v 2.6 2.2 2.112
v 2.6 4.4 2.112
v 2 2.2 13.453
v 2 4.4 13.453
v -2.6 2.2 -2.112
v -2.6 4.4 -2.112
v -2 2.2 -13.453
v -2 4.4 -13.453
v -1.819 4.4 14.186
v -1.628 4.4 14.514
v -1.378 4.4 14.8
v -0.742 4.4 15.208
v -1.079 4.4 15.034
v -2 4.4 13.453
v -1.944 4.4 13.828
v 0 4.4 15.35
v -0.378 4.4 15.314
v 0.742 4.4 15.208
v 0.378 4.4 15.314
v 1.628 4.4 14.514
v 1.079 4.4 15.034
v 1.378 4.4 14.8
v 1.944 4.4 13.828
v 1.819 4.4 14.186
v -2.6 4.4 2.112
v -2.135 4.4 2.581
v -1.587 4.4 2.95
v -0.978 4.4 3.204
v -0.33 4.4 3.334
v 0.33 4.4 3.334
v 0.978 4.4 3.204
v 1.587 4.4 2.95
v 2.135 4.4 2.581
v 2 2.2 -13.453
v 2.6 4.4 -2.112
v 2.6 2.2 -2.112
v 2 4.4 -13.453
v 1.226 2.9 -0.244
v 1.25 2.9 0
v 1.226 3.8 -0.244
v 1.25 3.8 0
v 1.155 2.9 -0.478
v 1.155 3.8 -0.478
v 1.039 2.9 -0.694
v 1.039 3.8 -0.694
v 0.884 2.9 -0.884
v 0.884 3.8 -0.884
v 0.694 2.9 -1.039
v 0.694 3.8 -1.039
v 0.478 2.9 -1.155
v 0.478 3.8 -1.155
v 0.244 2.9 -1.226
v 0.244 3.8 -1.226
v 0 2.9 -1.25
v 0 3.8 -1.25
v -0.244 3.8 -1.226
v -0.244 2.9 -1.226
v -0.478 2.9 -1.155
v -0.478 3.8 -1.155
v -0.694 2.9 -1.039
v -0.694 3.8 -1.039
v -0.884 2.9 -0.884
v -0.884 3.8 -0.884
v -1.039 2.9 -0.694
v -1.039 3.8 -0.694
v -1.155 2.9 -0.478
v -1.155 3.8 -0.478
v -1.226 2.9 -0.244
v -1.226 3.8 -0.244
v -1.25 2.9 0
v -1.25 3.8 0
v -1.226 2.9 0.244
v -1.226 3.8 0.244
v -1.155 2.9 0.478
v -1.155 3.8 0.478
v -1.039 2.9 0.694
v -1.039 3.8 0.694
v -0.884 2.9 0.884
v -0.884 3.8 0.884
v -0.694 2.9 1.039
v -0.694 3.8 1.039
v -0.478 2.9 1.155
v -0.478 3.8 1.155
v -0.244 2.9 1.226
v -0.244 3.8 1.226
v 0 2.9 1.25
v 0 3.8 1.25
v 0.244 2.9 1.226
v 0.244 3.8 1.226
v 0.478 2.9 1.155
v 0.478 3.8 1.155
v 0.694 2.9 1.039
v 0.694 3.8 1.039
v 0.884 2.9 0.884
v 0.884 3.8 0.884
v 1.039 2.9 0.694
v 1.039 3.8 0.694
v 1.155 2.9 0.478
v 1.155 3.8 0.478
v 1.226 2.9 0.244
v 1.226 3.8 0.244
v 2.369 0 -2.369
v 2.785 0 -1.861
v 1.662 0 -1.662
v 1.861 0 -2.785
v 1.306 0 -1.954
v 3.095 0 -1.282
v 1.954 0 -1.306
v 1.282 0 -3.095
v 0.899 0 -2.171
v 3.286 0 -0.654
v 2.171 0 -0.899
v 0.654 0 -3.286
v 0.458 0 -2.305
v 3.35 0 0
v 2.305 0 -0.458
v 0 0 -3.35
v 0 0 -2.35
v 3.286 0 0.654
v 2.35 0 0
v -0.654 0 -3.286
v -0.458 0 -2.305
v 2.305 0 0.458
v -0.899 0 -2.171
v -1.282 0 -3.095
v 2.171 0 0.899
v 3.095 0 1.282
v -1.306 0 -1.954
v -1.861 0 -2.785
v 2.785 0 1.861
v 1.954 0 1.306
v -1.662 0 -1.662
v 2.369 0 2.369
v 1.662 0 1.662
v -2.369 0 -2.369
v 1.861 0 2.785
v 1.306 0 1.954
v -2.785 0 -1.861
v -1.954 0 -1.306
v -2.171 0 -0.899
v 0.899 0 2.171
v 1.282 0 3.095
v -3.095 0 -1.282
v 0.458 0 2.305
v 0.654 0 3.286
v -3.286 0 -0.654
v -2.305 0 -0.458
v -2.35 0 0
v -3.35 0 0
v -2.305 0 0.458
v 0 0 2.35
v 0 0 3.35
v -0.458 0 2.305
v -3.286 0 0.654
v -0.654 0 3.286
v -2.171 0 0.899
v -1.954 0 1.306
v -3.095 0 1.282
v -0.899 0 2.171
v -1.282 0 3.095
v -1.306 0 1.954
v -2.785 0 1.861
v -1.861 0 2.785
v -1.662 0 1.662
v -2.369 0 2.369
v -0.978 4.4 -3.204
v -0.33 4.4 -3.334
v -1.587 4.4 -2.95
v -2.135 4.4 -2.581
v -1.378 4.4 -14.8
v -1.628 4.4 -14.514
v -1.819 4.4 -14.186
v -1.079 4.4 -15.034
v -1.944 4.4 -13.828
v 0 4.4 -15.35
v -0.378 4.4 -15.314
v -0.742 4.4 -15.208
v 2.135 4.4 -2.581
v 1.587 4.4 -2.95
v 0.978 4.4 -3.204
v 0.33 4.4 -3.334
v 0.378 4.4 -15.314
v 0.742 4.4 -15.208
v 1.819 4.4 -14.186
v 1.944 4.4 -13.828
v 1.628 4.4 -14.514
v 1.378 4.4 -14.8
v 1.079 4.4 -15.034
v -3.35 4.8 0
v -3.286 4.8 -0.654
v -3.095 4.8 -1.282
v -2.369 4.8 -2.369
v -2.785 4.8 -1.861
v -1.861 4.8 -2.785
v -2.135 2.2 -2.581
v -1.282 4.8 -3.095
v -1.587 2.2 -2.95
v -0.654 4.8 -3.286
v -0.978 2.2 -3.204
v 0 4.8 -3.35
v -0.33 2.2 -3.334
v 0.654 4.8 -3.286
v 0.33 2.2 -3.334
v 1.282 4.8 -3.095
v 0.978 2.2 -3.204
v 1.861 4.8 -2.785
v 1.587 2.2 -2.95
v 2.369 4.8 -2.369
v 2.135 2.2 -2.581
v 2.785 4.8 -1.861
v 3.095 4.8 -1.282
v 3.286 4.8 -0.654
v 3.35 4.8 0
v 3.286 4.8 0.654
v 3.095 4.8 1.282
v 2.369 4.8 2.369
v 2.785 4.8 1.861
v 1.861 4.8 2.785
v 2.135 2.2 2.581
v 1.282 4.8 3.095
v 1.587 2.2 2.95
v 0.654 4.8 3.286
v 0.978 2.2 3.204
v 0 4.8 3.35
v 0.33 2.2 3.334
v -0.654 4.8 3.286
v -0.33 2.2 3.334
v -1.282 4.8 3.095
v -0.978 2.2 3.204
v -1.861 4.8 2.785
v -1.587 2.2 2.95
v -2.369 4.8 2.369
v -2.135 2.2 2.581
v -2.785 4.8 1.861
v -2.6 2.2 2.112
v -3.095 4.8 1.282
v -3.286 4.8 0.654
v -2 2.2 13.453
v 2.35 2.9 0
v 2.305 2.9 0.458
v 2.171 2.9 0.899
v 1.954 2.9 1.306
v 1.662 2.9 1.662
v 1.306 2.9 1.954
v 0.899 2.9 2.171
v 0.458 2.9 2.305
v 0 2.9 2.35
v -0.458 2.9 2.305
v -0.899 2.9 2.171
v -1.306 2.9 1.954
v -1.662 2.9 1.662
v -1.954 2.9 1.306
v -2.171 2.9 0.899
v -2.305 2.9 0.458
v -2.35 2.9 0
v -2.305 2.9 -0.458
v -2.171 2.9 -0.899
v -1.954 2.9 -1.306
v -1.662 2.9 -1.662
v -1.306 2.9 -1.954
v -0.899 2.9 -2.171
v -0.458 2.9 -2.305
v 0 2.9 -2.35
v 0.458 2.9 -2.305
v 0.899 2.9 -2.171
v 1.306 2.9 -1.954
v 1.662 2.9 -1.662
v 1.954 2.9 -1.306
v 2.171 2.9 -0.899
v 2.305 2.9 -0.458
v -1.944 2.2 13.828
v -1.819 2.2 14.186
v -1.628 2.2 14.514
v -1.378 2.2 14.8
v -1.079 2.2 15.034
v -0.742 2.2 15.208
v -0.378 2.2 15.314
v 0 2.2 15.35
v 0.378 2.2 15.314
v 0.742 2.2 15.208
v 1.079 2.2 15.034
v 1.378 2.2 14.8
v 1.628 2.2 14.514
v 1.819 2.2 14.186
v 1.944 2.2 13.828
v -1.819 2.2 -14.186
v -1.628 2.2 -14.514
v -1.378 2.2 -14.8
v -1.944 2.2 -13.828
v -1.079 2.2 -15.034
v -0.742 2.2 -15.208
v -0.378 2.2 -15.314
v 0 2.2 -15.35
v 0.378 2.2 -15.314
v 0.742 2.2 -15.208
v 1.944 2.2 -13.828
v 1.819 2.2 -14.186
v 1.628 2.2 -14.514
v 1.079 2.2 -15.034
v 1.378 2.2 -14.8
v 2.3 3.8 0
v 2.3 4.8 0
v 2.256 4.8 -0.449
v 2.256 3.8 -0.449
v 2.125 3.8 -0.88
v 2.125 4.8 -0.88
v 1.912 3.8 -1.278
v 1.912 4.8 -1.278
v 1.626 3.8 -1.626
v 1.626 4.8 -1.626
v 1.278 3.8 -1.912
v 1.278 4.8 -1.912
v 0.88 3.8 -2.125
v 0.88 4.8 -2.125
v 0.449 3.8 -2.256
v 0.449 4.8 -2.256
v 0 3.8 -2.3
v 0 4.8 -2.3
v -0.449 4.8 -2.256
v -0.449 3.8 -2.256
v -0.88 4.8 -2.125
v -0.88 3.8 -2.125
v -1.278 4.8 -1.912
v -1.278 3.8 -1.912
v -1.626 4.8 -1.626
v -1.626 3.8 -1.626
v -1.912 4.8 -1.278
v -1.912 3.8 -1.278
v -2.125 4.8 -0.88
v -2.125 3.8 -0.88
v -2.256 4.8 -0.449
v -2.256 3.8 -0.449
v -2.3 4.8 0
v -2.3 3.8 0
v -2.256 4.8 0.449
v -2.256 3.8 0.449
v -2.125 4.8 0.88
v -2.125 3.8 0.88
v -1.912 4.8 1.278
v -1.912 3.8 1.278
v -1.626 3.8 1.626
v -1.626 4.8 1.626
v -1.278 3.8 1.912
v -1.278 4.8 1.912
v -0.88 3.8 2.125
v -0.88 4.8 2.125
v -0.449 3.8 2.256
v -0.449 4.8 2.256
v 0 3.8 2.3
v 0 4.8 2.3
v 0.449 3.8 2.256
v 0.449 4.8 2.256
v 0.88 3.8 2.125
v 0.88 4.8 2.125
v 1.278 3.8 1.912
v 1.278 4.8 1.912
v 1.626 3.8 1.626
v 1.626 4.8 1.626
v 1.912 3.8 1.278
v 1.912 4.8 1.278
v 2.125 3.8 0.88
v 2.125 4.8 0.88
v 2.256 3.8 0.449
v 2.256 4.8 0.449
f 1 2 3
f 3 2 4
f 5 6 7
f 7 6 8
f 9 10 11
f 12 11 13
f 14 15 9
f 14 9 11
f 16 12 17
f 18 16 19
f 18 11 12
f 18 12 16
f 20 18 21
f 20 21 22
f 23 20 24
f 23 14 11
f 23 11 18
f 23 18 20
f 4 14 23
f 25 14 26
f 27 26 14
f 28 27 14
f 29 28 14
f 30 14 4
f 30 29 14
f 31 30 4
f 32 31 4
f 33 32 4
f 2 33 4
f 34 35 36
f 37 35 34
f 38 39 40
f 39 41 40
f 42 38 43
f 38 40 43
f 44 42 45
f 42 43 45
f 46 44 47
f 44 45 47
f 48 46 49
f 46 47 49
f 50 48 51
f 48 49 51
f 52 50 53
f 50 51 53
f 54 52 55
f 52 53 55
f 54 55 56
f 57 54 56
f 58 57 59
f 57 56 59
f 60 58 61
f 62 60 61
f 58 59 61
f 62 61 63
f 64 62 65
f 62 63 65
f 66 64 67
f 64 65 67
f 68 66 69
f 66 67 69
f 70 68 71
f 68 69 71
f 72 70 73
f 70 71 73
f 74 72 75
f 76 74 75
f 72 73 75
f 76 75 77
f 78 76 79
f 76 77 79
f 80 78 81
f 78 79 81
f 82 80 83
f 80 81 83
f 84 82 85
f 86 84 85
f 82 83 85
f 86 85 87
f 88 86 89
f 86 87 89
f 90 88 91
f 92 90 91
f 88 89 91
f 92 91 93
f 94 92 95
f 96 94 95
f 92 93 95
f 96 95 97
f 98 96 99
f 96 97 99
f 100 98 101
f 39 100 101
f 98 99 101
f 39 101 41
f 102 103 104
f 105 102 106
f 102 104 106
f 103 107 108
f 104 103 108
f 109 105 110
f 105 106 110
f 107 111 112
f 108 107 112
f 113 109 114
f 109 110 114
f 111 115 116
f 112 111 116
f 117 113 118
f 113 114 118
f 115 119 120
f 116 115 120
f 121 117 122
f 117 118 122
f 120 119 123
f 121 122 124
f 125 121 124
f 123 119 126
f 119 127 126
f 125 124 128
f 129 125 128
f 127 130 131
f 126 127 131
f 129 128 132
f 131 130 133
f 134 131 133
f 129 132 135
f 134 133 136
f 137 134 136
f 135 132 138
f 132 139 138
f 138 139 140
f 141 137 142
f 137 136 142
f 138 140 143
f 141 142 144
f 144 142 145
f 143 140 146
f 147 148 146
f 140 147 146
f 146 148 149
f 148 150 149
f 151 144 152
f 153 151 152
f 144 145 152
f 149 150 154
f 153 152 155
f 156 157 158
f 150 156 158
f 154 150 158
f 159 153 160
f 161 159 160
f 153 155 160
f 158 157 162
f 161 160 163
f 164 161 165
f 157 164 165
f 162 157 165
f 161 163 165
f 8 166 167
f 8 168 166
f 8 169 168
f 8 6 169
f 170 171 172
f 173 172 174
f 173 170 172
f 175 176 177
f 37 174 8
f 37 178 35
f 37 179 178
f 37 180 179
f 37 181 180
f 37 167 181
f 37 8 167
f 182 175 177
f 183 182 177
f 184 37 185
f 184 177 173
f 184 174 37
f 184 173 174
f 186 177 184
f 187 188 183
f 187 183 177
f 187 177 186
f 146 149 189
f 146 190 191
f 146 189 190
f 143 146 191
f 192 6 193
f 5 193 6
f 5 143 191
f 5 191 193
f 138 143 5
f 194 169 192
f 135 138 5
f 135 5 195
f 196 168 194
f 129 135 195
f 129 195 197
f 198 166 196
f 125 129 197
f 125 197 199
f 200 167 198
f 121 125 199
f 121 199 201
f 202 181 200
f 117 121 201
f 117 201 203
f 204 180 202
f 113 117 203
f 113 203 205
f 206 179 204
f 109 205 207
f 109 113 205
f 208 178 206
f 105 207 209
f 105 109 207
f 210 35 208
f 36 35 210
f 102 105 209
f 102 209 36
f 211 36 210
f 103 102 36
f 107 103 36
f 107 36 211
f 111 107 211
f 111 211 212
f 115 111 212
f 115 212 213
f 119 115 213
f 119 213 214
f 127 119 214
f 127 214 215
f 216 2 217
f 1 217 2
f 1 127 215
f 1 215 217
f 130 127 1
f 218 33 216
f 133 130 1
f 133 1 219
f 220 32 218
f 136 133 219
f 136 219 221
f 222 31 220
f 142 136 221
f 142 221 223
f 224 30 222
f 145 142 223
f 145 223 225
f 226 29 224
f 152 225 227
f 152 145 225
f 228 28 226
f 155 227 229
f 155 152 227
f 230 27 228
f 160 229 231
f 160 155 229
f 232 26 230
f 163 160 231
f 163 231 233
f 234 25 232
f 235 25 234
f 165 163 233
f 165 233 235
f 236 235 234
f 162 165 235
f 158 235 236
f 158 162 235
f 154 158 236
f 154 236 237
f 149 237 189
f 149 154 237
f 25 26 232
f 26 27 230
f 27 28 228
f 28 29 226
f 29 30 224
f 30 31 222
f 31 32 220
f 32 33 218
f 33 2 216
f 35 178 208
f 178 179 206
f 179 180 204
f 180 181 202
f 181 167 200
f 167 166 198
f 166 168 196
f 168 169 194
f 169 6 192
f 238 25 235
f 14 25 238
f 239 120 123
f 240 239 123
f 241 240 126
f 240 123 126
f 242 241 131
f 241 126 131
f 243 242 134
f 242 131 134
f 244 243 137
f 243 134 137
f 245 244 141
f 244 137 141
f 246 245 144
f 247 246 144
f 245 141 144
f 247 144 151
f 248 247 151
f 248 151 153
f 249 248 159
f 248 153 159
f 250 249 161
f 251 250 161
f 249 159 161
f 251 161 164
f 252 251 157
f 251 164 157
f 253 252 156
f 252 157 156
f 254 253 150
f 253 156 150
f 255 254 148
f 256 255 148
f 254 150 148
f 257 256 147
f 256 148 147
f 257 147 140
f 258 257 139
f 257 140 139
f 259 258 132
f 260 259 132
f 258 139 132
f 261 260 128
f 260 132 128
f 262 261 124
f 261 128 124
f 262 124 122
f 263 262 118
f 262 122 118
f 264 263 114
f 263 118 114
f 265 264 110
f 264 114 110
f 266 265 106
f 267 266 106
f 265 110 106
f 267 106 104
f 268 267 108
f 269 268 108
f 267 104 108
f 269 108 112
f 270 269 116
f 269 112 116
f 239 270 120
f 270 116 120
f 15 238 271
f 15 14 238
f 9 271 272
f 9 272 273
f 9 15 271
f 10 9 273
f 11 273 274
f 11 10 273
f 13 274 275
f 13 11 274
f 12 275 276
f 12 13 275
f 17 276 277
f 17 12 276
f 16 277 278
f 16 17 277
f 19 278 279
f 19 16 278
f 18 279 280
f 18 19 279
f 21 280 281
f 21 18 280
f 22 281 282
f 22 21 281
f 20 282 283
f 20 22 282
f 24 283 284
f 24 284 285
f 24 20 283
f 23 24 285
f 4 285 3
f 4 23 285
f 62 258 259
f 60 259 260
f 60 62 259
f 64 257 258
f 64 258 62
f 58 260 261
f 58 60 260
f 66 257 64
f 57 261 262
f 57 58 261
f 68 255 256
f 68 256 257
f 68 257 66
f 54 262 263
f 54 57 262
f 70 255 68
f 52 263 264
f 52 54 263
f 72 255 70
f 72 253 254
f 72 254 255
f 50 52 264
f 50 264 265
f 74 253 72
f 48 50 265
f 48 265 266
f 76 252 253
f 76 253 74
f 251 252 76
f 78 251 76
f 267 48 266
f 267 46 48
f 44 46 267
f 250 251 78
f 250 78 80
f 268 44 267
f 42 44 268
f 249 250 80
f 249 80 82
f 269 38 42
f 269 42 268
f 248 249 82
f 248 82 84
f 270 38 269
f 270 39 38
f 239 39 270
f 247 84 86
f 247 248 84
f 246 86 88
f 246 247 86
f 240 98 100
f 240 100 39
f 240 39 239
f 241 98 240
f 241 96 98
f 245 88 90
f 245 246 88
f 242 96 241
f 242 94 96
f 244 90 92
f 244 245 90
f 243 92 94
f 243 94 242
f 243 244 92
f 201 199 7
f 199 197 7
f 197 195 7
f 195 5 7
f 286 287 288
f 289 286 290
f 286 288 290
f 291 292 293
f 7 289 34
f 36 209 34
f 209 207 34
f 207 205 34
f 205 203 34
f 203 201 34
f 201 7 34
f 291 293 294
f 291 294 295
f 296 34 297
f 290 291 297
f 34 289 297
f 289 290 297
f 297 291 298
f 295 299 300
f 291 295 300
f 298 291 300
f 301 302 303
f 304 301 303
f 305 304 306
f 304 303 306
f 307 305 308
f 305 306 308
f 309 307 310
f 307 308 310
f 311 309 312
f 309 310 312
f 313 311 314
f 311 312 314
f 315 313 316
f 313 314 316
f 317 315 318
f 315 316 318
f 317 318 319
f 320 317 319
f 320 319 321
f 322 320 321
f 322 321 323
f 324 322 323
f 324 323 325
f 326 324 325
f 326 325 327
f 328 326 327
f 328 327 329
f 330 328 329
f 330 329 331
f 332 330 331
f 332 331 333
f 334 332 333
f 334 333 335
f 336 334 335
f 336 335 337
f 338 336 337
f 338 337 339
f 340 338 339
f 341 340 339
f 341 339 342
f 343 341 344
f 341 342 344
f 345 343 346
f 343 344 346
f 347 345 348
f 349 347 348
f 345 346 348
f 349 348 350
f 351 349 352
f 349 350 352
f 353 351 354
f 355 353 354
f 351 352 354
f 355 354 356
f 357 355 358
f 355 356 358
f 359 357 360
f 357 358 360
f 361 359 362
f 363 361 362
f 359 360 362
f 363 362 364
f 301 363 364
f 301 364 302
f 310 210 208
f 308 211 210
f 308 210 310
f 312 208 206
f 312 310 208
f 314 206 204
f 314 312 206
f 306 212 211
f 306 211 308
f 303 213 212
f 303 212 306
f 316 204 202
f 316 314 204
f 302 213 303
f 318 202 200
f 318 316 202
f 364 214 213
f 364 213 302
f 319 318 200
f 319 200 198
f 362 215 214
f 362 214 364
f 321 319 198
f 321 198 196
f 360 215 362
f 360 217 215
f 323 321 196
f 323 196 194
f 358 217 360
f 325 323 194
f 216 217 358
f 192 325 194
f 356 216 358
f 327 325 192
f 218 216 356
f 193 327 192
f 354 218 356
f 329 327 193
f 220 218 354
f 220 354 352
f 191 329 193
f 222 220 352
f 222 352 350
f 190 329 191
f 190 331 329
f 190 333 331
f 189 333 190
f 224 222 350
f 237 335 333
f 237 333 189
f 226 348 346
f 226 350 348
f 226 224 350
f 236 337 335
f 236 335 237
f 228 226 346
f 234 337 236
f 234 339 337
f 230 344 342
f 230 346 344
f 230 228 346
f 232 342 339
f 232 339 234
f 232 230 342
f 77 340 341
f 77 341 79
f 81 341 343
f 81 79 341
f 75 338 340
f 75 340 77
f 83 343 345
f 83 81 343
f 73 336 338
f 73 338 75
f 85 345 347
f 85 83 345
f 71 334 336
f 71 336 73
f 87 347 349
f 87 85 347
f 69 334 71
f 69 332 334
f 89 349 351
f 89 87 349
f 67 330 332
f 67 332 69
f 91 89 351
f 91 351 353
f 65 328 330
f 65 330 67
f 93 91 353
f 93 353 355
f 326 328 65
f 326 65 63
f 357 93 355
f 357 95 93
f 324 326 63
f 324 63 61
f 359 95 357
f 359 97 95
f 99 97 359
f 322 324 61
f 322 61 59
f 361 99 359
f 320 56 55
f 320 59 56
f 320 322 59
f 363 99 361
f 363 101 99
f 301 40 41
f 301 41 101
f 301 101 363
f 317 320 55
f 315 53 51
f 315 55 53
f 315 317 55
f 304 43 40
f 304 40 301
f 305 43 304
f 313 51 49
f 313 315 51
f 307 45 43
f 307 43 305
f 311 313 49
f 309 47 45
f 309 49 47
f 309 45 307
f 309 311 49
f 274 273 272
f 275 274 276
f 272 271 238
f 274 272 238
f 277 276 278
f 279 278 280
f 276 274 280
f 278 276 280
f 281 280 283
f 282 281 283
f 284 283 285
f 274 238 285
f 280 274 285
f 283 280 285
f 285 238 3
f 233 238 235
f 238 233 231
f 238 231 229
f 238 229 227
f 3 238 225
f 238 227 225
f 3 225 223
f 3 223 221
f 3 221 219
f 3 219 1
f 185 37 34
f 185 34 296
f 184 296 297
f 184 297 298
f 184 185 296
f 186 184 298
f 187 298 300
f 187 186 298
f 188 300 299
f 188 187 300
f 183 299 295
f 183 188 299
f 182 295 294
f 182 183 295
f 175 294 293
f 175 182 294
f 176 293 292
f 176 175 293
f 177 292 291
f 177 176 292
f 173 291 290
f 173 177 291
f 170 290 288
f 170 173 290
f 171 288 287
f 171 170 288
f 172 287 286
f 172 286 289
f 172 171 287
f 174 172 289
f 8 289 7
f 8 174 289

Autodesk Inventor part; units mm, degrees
ref_plane "YZ Plane" through (0, 0, 0) normal (1, 0, 0) x (0, 1, 0)
ref_plane "XZ Plane" through (0, 0, 0) normal (0, 1, 0) x (-1, 0, 0)
sketch "Sketch1" plane through (0, 0, 0) normal (0, 1, 0) x (-1, 0, 0)
  circle A0 centre (0, 0) radius 3.35
  dimension "d0" = 6.7
extrude "Extrusion1" add sketch "Sketch1" along normal blind 4.8
ref_plane "Work Plane1" through (0, 4.4, 0) normal (0, 1, 0) x (1, 0, 0)
sketch "Sketch2" plane through (0, 4.4, 0) normal (0, 1, 0) x (1, 0, 0)
  circle A0 centre (0, 0) radius 3.35 projected
  line L0 (-2.6, 2.1125) -> (-2, 13.453)
  circle A1 centre (0, 0) radius 3.35 projected
  line L1 (2.6, 2.1125) -> (2, 13.453)
  arc A2 (2, 13.453) -> (-2, 13.453) centre (0, 13.3472) ccw
  line L2 (-2, 13.453) -> (2, 13.453) construction
  line L3 (2.6, 2.1125) -> (-2.6, 2.1125) construction
  line L4 (0, 0) -> (-1.2831, 0)
  line L5 (-2.6, -2.1125) -> (-2, -13.453)
  line L6 (2.6, -2.1125) -> (2, -13.453)
  arc A3 (-2, -13.453) -> (2, -13.453) centre (0, -13.3472) ccw
  line L7 (-2, -13.453) -> (2, -13.453) construction
  line L8 (2.6, -2.1125) -> (-2.6, -2.1125) construction
  dimension "d4" = 5.2
  dimension "d5" = 12
  dimension "d6" = 4
extrude "Extrusion2" add sketch "Sketch2" against normal blind 2.2 contours A0 L0 A2 L1 | L6 A3 L5 A0
sketch "Sketch3" plane through (0, 4.8, 0) normal (0, 1, 0) x (1, 0, 0)
  circle A0 centre (0, 0) radius 1.25
  circle A1 centre (0, 0) radius 2.3
  dimension "d9" = 2.5
  dimension "d10" = 4.6
extrude "Extrusion3" cut sketch "Sketch3" against normal through all contours A0
extrude "Extrusion4" cut sketch "Sketch3" against normal blind 1
sketch "Sketch4" plane through (0, 0, 0) normal (0, -1, 0) x (1, 0, 0)
  circle A0 centre (0, 0) radius 2.35
  dimension "d15" = 4.7
extrude "Extrusion5" cut sketch "Sketch4" against normal blind 2.9
properties part number "attachmnet" material "Nylon 6/6"
